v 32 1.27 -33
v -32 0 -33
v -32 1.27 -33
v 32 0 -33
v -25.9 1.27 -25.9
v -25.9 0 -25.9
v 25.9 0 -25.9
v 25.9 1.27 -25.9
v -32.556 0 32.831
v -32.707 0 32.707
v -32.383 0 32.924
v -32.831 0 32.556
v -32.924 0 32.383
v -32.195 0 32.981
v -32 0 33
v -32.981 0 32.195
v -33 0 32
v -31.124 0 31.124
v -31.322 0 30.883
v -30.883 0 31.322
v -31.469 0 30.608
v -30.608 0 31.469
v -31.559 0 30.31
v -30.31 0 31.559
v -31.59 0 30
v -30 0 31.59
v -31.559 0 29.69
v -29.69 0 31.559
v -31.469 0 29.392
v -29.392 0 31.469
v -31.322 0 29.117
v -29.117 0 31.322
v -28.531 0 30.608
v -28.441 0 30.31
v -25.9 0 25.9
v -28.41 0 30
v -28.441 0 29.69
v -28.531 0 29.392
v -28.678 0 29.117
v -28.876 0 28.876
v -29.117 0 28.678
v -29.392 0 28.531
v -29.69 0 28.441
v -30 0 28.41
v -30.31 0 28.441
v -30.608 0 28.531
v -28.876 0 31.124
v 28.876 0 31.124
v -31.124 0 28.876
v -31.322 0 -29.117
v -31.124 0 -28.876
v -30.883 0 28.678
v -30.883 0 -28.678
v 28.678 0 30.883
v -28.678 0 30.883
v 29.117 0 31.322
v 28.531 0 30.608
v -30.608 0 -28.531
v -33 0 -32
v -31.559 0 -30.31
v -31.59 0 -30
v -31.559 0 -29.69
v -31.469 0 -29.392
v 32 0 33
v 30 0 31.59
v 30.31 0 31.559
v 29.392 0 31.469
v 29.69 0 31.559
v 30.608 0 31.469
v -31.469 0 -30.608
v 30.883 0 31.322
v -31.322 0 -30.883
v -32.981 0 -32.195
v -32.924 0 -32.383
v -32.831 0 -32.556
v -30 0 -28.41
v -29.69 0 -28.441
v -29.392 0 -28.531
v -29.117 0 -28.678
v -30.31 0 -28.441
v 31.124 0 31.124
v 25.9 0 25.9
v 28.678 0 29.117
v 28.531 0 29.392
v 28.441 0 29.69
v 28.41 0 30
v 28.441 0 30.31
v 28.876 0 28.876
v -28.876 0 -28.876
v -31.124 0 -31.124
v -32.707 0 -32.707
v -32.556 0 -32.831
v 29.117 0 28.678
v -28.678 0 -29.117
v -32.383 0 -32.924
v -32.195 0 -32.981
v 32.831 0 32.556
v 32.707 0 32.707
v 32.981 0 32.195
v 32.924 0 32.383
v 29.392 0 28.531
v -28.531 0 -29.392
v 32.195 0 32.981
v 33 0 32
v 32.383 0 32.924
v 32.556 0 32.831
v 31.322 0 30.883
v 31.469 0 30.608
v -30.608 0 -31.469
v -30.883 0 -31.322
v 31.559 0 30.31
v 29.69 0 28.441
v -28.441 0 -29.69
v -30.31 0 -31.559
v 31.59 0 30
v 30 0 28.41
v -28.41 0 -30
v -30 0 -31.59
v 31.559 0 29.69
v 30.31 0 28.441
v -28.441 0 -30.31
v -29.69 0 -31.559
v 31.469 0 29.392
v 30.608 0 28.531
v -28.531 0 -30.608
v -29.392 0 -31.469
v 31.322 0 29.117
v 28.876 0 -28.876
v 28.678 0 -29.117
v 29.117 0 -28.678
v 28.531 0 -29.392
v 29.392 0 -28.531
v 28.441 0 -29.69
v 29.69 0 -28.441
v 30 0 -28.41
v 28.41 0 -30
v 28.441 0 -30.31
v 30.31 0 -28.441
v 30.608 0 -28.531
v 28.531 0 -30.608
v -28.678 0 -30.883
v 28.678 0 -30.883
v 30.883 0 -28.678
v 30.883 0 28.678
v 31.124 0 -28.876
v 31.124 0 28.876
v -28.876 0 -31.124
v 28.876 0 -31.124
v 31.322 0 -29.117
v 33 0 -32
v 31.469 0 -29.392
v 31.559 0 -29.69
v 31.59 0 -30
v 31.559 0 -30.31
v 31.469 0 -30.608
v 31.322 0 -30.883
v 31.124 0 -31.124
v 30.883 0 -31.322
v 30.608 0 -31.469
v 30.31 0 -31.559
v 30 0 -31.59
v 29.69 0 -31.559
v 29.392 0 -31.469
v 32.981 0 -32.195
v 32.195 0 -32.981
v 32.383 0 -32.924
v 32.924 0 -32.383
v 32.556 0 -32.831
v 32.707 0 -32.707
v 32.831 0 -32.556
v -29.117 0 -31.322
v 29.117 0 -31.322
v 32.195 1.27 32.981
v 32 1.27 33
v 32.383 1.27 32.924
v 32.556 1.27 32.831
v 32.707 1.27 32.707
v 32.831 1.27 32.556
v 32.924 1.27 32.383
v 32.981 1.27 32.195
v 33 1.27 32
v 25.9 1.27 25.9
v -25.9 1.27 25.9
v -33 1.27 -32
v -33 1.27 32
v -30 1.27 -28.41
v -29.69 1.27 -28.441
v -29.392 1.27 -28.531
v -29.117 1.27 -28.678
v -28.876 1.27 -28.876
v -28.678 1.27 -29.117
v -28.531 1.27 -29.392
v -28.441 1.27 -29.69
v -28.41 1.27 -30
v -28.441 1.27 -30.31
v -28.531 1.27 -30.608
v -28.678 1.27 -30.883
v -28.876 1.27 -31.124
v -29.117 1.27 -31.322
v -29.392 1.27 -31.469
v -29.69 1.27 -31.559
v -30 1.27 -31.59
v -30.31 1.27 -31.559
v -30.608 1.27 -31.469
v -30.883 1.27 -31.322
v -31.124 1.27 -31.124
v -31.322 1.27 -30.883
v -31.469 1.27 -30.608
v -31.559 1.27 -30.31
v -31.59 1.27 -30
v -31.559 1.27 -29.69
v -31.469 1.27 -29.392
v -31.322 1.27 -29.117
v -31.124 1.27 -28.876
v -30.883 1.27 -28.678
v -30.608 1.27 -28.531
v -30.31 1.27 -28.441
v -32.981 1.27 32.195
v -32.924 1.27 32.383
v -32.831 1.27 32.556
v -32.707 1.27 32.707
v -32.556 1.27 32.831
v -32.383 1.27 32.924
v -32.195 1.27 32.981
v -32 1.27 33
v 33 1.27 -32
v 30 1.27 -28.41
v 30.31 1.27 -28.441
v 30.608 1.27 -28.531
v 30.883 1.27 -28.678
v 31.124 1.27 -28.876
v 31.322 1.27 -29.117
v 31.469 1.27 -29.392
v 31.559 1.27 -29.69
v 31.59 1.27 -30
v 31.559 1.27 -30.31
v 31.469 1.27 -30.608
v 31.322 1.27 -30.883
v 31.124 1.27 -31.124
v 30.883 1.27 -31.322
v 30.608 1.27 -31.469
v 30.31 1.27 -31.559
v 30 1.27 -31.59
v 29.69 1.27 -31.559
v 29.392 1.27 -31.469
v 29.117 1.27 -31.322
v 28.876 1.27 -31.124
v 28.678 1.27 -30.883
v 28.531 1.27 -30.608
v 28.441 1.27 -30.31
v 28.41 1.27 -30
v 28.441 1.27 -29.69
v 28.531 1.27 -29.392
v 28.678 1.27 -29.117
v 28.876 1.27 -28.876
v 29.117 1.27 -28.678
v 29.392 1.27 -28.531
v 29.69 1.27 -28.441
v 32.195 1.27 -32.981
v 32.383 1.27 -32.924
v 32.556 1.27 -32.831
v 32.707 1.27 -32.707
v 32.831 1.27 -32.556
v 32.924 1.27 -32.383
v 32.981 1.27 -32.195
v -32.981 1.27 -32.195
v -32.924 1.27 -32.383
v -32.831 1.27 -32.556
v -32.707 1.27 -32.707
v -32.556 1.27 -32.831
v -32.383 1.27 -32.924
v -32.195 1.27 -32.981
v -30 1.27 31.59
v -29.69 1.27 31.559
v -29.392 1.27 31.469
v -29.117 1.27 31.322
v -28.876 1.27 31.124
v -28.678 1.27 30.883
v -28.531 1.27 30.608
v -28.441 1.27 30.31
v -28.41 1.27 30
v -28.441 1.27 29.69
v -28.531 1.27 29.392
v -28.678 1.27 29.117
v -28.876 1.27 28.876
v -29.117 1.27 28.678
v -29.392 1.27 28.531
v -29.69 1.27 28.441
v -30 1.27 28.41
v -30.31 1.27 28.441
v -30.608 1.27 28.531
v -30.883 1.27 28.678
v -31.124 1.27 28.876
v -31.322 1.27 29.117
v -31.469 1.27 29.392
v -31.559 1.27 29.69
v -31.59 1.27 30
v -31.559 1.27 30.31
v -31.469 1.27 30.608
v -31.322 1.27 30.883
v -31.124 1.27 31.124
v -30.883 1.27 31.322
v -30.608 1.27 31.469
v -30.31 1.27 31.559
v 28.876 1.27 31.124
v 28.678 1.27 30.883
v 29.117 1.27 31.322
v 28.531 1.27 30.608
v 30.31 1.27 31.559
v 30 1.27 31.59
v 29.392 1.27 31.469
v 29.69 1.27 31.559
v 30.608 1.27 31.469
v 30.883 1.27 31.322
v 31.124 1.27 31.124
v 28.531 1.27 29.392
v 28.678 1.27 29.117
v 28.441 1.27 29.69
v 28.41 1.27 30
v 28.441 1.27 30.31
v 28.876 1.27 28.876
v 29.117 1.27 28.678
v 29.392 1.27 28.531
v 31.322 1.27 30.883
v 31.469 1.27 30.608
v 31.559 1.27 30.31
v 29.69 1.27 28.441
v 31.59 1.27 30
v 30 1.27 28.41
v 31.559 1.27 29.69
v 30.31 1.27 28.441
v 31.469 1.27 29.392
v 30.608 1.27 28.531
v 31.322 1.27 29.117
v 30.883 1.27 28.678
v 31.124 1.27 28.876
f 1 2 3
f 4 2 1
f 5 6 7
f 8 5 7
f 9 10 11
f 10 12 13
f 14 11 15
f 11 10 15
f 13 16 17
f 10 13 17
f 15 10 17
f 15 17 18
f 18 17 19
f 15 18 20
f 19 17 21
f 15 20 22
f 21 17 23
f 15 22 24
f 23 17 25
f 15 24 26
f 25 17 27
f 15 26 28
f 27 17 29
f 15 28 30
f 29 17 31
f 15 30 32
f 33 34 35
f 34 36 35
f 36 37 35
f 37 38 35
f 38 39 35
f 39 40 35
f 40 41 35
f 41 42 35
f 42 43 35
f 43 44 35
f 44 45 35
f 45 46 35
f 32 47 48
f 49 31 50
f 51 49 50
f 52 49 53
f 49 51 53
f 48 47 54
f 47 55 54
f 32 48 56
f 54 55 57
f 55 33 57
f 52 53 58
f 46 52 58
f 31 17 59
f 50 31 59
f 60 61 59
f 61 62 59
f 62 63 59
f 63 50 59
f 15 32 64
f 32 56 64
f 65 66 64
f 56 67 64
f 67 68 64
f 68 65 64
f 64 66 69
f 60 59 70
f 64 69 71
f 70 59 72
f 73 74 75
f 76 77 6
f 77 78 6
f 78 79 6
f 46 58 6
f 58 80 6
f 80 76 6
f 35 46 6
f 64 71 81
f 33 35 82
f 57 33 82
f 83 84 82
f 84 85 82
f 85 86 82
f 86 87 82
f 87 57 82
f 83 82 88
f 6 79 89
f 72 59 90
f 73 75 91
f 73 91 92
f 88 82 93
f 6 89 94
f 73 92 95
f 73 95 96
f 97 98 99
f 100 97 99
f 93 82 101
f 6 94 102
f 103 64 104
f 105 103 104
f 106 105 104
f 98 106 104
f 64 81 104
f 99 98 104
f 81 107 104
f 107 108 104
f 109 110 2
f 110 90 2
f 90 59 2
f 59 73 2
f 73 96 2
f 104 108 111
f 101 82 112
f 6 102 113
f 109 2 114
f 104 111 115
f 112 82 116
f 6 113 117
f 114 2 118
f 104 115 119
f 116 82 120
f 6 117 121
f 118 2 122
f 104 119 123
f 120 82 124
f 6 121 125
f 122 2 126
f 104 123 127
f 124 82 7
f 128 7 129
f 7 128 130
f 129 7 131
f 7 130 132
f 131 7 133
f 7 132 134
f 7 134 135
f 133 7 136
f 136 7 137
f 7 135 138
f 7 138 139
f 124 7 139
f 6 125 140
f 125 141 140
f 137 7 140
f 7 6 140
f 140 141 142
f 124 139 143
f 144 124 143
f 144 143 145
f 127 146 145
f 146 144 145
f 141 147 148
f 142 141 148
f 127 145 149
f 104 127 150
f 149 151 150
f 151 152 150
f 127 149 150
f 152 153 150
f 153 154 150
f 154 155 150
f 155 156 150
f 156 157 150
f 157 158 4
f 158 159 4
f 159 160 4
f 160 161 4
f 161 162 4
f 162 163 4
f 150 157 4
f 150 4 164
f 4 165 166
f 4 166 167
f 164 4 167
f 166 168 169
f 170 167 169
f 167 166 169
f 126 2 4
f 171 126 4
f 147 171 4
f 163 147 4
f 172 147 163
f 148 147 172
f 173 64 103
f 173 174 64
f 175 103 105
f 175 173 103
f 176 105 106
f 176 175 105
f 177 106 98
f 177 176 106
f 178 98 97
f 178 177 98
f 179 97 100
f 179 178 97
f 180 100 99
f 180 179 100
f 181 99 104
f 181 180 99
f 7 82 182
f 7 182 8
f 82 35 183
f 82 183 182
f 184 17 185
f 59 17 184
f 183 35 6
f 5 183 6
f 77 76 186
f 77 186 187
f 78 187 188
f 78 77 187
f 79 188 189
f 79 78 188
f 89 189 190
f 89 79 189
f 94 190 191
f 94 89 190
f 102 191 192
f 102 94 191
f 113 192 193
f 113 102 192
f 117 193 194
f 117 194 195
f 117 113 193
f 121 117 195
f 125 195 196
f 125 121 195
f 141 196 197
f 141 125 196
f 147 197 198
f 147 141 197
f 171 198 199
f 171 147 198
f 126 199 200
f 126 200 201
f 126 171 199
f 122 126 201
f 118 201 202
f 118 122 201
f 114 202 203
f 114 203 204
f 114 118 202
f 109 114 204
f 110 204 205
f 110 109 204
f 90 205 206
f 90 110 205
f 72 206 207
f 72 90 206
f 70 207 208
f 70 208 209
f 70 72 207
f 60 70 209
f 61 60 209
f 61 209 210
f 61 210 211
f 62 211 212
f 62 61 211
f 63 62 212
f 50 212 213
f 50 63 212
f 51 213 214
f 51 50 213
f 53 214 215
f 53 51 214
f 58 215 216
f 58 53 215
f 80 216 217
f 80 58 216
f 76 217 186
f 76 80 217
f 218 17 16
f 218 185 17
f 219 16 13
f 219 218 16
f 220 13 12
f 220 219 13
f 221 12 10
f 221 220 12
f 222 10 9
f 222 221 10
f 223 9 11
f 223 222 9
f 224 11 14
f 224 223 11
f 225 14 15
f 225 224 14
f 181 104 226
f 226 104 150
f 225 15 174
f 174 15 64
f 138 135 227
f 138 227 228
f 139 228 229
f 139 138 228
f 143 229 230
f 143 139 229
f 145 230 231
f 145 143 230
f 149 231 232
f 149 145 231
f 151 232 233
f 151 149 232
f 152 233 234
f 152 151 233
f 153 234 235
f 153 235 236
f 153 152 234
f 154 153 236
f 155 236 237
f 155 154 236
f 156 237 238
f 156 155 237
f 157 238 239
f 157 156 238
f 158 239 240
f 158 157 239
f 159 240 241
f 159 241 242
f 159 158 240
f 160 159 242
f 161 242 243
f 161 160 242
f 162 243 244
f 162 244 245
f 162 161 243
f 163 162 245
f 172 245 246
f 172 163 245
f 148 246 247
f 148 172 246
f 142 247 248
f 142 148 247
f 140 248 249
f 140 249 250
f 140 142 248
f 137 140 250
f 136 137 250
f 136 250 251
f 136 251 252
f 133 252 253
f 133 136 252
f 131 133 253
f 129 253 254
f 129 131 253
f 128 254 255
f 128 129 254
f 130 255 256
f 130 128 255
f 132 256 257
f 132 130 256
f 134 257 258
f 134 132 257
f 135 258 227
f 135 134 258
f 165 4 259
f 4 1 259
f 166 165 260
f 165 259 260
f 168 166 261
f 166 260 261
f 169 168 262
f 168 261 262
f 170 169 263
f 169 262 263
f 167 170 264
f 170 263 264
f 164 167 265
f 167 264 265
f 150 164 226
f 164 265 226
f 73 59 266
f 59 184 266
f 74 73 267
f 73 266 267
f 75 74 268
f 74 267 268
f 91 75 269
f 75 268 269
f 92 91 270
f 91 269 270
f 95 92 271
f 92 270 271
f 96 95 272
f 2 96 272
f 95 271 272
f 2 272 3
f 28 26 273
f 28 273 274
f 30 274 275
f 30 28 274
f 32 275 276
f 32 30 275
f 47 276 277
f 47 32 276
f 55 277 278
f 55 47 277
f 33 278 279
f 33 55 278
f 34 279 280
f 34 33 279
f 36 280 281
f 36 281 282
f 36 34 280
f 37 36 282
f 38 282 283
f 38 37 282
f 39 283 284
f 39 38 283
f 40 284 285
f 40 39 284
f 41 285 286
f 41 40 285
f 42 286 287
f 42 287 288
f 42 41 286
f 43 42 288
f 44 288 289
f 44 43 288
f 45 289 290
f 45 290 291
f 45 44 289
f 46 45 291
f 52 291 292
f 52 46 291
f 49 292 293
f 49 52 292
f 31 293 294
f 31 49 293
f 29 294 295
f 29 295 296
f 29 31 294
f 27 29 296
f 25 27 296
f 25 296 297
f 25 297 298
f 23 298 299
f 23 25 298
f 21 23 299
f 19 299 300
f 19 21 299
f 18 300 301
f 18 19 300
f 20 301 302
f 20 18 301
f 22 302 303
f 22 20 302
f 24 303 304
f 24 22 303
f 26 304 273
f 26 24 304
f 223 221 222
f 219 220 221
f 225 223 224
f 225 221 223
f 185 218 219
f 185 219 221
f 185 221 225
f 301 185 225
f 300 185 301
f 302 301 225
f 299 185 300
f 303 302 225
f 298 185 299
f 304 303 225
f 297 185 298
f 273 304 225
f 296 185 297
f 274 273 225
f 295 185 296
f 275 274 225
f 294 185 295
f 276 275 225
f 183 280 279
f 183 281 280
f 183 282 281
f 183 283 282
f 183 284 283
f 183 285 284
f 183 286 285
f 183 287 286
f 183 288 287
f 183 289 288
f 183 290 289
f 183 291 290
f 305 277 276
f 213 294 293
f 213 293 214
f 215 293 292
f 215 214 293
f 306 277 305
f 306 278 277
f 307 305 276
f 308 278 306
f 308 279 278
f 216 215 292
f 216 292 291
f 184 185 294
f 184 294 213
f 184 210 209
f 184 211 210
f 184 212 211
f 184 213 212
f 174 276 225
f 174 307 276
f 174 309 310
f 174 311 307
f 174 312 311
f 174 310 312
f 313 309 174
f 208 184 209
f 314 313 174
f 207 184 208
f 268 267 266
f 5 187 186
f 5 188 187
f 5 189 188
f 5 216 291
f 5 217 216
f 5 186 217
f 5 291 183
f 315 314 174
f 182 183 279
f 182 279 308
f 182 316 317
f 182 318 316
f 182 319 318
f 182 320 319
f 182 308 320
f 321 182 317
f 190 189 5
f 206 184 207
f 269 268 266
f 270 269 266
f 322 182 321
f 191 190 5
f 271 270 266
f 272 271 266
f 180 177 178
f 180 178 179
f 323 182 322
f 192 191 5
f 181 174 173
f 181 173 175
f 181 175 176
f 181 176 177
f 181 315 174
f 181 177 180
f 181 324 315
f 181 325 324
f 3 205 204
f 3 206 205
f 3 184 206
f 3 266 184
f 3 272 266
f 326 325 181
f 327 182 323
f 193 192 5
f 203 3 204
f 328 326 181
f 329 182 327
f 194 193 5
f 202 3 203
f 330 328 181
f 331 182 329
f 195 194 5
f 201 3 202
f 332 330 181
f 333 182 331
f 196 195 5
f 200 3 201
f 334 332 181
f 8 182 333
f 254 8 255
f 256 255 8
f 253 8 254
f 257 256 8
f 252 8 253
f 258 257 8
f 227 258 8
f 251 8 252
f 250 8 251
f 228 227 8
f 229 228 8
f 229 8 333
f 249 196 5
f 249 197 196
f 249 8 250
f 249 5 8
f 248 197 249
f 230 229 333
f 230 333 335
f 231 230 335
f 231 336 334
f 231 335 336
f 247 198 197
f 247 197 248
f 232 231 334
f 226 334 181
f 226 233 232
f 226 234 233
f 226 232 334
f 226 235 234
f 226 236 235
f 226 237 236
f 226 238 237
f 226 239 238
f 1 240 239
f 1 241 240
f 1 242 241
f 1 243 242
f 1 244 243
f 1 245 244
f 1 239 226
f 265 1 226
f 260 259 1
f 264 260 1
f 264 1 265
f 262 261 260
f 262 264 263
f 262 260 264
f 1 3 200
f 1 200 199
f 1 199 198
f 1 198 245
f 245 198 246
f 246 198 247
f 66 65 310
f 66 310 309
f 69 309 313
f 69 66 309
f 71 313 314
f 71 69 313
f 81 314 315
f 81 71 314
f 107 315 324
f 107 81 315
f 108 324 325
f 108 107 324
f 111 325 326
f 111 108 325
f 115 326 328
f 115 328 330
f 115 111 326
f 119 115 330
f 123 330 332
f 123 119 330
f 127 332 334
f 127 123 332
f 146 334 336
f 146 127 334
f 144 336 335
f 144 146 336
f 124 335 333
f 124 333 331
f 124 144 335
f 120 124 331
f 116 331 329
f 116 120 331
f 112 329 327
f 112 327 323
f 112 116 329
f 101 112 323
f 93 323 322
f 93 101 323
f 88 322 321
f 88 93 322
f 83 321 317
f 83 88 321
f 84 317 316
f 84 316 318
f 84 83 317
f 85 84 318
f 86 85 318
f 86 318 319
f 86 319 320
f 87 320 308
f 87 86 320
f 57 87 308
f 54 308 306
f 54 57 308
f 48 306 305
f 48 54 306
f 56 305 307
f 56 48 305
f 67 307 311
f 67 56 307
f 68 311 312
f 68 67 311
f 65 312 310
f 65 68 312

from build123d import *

# Parameters (mm, degrees)
SKETCH1_W           = 66
SKETCH1_H           = 66
SKETCH1_R           = 1.59
SKETCH1_W_2         = 51.8
SKETCH1_H_2         = 51.8
BOSS_EXTRUDE1_DEPTH = 1.27
FILLET1_R           = 1


with BuildPart() as part:
    # Sketch1 → Boss-Extrude1 (new body)
    with BuildSketch(Plane(origin=(0, 0, 0), x_dir=(1, 0, 0), z_dir=(0, 1, 0))):
        Rectangle(SKETCH1_W, SKETCH1_H)
        with Locations(Location((-30, 30, 0), (0, 0, 270))):
            Circle(SKETCH1_R, mode=Mode.SUBTRACT)
        with Locations(Location((30, 30, 0), (0, 0, 270))):
            Circle(SKETCH1_R, mode=Mode.SUBTRACT)
        with Locations(Location((30, -30, 0), (0, 0, 270))):
            Circle(SKETCH1_R, mode=Mode.SUBTRACT)
        with Locations(Location((-30, -30, 0), (0, 0, 270))):
            Circle(SKETCH1_R, mode=Mode.SUBTRACT)
        Rectangle(SKETCH1_W_2, SKETCH1_H_2, mode=Mode.SUBTRACT)
    extrude(amount=BOSS_EXTRUDE1_DEPTH)

    # Fillet1
    fillet1_edges = [part.edges().sort_by_distance(p)[0] for p in [
        (33, 0.635, 33),
        (-33, 0.635, 33),
        (-33, 0.635, -33),
        (33, 0.635, -33),
    ]]
    fillet(fillet1_edges, radius=FILLET1_R)


solid = part.part
